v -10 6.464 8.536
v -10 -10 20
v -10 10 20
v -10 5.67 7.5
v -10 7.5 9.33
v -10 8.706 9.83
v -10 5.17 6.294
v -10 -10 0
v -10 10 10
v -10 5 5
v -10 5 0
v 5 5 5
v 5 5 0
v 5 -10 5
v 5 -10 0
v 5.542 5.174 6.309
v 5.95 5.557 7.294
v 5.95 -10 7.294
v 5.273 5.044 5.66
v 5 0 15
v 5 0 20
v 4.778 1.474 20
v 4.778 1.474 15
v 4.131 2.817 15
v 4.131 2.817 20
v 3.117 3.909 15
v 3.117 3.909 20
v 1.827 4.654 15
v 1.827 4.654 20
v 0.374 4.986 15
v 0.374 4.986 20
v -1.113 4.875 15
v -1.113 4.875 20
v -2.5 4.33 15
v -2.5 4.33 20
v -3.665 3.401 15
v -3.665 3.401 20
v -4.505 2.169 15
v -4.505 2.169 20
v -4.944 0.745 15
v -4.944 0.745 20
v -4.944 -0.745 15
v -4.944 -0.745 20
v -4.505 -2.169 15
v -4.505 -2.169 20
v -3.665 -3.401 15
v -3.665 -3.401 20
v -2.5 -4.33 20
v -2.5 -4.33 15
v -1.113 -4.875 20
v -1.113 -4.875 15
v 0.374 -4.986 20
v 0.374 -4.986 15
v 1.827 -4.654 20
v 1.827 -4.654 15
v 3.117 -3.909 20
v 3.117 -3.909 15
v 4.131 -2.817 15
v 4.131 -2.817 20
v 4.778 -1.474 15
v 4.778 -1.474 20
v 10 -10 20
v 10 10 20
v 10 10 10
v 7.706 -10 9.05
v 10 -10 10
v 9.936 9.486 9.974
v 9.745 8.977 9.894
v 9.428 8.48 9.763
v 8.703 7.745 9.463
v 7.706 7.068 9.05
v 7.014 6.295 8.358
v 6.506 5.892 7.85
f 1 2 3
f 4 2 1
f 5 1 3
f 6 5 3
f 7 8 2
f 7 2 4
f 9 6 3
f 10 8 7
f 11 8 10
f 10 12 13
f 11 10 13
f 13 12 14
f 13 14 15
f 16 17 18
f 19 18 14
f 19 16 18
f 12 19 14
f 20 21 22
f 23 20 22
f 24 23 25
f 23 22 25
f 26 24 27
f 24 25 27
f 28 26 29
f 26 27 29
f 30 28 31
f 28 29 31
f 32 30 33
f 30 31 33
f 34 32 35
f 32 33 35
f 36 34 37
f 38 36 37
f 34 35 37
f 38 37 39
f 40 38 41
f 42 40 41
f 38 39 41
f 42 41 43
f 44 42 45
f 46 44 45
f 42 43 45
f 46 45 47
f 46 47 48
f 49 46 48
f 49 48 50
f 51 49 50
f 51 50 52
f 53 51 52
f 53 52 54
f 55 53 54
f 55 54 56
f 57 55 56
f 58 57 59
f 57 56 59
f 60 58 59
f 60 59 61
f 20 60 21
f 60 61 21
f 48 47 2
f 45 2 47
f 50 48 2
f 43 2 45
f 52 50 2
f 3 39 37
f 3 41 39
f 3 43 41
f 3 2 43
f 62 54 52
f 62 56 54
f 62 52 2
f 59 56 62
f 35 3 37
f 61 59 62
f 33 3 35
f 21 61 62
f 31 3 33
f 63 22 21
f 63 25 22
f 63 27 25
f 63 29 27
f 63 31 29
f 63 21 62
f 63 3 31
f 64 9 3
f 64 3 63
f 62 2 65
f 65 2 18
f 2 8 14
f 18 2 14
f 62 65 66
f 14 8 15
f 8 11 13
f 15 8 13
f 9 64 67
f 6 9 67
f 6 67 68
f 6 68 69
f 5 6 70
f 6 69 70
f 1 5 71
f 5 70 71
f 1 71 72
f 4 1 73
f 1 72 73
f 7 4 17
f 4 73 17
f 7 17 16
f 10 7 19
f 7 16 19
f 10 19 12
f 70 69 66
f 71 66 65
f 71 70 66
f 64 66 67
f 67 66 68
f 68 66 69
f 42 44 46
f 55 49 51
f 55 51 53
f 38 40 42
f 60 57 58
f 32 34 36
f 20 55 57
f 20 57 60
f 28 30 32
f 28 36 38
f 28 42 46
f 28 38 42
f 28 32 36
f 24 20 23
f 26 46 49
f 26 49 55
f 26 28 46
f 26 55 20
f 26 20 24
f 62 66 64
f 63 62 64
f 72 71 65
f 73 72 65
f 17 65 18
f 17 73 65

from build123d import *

# Parameters (mm, degrees)
F0_W          = 20
F0_H          = 20
F1_DEPTH      = 20
F3_DEPTH      = 10.001
F3_DEPTH_BACK = 10.001
F5_DEPTH      = 10.001
F5_DEPTH_BACK = 10.001
F6_R          = 5
F7_DEPTH      = 5


with BuildPart() as f1:
    # F0 (on Top) → F1 (new body)
    with BuildSketch(Plane.XY):
        Rectangle(F0_W, F0_H)
    extrude(amount=F1_DEPTH)

    # F2 (on Front) → F3 (cut, two sides)
    with BuildSketch(Plane.XZ) as f3_sk:
        Polygon((5, 5), (5, 0), (10, 0), (10, 10), (7.7059805007, 9.0497860111), (5.9502139889, 7.2940194993), align=None)
    extrude(amount=-F3_DEPTH, mode=Mode.SUBTRACT)
    extrude(f3_sk.sketch, amount=F3_DEPTH_BACK, mode=Mode.SUBTRACT)

    # F4 (on Right) → F5 (cut, two sides)
    with BuildSketch(Plane.YZ) as f5_sk:
        with BuildLine():
            Line((5, 5), (5, 0))
            Line((5, 0), (10, 0))
            Line((10, 0), (10, 10))
            ThreePointArc((10, 10), (6.4644660941, 8.5355339059), (5, 5))
        make_face()
    extrude(amount=-F5_DEPTH, mode=Mode.SUBTRACT)
    extrude(f5_sk.sketch, amount=F5_DEPTH_BACK, mode=Mode.SUBTRACT)

    # F6 (on face) → F7 (cut)
    with BuildSketch(Plane.XY.offset(20)):
        Circle(F6_R)
    extrude(amount=-F7_DEPTH, mode=Mode.SUBTRACT)


solid = f1.part
